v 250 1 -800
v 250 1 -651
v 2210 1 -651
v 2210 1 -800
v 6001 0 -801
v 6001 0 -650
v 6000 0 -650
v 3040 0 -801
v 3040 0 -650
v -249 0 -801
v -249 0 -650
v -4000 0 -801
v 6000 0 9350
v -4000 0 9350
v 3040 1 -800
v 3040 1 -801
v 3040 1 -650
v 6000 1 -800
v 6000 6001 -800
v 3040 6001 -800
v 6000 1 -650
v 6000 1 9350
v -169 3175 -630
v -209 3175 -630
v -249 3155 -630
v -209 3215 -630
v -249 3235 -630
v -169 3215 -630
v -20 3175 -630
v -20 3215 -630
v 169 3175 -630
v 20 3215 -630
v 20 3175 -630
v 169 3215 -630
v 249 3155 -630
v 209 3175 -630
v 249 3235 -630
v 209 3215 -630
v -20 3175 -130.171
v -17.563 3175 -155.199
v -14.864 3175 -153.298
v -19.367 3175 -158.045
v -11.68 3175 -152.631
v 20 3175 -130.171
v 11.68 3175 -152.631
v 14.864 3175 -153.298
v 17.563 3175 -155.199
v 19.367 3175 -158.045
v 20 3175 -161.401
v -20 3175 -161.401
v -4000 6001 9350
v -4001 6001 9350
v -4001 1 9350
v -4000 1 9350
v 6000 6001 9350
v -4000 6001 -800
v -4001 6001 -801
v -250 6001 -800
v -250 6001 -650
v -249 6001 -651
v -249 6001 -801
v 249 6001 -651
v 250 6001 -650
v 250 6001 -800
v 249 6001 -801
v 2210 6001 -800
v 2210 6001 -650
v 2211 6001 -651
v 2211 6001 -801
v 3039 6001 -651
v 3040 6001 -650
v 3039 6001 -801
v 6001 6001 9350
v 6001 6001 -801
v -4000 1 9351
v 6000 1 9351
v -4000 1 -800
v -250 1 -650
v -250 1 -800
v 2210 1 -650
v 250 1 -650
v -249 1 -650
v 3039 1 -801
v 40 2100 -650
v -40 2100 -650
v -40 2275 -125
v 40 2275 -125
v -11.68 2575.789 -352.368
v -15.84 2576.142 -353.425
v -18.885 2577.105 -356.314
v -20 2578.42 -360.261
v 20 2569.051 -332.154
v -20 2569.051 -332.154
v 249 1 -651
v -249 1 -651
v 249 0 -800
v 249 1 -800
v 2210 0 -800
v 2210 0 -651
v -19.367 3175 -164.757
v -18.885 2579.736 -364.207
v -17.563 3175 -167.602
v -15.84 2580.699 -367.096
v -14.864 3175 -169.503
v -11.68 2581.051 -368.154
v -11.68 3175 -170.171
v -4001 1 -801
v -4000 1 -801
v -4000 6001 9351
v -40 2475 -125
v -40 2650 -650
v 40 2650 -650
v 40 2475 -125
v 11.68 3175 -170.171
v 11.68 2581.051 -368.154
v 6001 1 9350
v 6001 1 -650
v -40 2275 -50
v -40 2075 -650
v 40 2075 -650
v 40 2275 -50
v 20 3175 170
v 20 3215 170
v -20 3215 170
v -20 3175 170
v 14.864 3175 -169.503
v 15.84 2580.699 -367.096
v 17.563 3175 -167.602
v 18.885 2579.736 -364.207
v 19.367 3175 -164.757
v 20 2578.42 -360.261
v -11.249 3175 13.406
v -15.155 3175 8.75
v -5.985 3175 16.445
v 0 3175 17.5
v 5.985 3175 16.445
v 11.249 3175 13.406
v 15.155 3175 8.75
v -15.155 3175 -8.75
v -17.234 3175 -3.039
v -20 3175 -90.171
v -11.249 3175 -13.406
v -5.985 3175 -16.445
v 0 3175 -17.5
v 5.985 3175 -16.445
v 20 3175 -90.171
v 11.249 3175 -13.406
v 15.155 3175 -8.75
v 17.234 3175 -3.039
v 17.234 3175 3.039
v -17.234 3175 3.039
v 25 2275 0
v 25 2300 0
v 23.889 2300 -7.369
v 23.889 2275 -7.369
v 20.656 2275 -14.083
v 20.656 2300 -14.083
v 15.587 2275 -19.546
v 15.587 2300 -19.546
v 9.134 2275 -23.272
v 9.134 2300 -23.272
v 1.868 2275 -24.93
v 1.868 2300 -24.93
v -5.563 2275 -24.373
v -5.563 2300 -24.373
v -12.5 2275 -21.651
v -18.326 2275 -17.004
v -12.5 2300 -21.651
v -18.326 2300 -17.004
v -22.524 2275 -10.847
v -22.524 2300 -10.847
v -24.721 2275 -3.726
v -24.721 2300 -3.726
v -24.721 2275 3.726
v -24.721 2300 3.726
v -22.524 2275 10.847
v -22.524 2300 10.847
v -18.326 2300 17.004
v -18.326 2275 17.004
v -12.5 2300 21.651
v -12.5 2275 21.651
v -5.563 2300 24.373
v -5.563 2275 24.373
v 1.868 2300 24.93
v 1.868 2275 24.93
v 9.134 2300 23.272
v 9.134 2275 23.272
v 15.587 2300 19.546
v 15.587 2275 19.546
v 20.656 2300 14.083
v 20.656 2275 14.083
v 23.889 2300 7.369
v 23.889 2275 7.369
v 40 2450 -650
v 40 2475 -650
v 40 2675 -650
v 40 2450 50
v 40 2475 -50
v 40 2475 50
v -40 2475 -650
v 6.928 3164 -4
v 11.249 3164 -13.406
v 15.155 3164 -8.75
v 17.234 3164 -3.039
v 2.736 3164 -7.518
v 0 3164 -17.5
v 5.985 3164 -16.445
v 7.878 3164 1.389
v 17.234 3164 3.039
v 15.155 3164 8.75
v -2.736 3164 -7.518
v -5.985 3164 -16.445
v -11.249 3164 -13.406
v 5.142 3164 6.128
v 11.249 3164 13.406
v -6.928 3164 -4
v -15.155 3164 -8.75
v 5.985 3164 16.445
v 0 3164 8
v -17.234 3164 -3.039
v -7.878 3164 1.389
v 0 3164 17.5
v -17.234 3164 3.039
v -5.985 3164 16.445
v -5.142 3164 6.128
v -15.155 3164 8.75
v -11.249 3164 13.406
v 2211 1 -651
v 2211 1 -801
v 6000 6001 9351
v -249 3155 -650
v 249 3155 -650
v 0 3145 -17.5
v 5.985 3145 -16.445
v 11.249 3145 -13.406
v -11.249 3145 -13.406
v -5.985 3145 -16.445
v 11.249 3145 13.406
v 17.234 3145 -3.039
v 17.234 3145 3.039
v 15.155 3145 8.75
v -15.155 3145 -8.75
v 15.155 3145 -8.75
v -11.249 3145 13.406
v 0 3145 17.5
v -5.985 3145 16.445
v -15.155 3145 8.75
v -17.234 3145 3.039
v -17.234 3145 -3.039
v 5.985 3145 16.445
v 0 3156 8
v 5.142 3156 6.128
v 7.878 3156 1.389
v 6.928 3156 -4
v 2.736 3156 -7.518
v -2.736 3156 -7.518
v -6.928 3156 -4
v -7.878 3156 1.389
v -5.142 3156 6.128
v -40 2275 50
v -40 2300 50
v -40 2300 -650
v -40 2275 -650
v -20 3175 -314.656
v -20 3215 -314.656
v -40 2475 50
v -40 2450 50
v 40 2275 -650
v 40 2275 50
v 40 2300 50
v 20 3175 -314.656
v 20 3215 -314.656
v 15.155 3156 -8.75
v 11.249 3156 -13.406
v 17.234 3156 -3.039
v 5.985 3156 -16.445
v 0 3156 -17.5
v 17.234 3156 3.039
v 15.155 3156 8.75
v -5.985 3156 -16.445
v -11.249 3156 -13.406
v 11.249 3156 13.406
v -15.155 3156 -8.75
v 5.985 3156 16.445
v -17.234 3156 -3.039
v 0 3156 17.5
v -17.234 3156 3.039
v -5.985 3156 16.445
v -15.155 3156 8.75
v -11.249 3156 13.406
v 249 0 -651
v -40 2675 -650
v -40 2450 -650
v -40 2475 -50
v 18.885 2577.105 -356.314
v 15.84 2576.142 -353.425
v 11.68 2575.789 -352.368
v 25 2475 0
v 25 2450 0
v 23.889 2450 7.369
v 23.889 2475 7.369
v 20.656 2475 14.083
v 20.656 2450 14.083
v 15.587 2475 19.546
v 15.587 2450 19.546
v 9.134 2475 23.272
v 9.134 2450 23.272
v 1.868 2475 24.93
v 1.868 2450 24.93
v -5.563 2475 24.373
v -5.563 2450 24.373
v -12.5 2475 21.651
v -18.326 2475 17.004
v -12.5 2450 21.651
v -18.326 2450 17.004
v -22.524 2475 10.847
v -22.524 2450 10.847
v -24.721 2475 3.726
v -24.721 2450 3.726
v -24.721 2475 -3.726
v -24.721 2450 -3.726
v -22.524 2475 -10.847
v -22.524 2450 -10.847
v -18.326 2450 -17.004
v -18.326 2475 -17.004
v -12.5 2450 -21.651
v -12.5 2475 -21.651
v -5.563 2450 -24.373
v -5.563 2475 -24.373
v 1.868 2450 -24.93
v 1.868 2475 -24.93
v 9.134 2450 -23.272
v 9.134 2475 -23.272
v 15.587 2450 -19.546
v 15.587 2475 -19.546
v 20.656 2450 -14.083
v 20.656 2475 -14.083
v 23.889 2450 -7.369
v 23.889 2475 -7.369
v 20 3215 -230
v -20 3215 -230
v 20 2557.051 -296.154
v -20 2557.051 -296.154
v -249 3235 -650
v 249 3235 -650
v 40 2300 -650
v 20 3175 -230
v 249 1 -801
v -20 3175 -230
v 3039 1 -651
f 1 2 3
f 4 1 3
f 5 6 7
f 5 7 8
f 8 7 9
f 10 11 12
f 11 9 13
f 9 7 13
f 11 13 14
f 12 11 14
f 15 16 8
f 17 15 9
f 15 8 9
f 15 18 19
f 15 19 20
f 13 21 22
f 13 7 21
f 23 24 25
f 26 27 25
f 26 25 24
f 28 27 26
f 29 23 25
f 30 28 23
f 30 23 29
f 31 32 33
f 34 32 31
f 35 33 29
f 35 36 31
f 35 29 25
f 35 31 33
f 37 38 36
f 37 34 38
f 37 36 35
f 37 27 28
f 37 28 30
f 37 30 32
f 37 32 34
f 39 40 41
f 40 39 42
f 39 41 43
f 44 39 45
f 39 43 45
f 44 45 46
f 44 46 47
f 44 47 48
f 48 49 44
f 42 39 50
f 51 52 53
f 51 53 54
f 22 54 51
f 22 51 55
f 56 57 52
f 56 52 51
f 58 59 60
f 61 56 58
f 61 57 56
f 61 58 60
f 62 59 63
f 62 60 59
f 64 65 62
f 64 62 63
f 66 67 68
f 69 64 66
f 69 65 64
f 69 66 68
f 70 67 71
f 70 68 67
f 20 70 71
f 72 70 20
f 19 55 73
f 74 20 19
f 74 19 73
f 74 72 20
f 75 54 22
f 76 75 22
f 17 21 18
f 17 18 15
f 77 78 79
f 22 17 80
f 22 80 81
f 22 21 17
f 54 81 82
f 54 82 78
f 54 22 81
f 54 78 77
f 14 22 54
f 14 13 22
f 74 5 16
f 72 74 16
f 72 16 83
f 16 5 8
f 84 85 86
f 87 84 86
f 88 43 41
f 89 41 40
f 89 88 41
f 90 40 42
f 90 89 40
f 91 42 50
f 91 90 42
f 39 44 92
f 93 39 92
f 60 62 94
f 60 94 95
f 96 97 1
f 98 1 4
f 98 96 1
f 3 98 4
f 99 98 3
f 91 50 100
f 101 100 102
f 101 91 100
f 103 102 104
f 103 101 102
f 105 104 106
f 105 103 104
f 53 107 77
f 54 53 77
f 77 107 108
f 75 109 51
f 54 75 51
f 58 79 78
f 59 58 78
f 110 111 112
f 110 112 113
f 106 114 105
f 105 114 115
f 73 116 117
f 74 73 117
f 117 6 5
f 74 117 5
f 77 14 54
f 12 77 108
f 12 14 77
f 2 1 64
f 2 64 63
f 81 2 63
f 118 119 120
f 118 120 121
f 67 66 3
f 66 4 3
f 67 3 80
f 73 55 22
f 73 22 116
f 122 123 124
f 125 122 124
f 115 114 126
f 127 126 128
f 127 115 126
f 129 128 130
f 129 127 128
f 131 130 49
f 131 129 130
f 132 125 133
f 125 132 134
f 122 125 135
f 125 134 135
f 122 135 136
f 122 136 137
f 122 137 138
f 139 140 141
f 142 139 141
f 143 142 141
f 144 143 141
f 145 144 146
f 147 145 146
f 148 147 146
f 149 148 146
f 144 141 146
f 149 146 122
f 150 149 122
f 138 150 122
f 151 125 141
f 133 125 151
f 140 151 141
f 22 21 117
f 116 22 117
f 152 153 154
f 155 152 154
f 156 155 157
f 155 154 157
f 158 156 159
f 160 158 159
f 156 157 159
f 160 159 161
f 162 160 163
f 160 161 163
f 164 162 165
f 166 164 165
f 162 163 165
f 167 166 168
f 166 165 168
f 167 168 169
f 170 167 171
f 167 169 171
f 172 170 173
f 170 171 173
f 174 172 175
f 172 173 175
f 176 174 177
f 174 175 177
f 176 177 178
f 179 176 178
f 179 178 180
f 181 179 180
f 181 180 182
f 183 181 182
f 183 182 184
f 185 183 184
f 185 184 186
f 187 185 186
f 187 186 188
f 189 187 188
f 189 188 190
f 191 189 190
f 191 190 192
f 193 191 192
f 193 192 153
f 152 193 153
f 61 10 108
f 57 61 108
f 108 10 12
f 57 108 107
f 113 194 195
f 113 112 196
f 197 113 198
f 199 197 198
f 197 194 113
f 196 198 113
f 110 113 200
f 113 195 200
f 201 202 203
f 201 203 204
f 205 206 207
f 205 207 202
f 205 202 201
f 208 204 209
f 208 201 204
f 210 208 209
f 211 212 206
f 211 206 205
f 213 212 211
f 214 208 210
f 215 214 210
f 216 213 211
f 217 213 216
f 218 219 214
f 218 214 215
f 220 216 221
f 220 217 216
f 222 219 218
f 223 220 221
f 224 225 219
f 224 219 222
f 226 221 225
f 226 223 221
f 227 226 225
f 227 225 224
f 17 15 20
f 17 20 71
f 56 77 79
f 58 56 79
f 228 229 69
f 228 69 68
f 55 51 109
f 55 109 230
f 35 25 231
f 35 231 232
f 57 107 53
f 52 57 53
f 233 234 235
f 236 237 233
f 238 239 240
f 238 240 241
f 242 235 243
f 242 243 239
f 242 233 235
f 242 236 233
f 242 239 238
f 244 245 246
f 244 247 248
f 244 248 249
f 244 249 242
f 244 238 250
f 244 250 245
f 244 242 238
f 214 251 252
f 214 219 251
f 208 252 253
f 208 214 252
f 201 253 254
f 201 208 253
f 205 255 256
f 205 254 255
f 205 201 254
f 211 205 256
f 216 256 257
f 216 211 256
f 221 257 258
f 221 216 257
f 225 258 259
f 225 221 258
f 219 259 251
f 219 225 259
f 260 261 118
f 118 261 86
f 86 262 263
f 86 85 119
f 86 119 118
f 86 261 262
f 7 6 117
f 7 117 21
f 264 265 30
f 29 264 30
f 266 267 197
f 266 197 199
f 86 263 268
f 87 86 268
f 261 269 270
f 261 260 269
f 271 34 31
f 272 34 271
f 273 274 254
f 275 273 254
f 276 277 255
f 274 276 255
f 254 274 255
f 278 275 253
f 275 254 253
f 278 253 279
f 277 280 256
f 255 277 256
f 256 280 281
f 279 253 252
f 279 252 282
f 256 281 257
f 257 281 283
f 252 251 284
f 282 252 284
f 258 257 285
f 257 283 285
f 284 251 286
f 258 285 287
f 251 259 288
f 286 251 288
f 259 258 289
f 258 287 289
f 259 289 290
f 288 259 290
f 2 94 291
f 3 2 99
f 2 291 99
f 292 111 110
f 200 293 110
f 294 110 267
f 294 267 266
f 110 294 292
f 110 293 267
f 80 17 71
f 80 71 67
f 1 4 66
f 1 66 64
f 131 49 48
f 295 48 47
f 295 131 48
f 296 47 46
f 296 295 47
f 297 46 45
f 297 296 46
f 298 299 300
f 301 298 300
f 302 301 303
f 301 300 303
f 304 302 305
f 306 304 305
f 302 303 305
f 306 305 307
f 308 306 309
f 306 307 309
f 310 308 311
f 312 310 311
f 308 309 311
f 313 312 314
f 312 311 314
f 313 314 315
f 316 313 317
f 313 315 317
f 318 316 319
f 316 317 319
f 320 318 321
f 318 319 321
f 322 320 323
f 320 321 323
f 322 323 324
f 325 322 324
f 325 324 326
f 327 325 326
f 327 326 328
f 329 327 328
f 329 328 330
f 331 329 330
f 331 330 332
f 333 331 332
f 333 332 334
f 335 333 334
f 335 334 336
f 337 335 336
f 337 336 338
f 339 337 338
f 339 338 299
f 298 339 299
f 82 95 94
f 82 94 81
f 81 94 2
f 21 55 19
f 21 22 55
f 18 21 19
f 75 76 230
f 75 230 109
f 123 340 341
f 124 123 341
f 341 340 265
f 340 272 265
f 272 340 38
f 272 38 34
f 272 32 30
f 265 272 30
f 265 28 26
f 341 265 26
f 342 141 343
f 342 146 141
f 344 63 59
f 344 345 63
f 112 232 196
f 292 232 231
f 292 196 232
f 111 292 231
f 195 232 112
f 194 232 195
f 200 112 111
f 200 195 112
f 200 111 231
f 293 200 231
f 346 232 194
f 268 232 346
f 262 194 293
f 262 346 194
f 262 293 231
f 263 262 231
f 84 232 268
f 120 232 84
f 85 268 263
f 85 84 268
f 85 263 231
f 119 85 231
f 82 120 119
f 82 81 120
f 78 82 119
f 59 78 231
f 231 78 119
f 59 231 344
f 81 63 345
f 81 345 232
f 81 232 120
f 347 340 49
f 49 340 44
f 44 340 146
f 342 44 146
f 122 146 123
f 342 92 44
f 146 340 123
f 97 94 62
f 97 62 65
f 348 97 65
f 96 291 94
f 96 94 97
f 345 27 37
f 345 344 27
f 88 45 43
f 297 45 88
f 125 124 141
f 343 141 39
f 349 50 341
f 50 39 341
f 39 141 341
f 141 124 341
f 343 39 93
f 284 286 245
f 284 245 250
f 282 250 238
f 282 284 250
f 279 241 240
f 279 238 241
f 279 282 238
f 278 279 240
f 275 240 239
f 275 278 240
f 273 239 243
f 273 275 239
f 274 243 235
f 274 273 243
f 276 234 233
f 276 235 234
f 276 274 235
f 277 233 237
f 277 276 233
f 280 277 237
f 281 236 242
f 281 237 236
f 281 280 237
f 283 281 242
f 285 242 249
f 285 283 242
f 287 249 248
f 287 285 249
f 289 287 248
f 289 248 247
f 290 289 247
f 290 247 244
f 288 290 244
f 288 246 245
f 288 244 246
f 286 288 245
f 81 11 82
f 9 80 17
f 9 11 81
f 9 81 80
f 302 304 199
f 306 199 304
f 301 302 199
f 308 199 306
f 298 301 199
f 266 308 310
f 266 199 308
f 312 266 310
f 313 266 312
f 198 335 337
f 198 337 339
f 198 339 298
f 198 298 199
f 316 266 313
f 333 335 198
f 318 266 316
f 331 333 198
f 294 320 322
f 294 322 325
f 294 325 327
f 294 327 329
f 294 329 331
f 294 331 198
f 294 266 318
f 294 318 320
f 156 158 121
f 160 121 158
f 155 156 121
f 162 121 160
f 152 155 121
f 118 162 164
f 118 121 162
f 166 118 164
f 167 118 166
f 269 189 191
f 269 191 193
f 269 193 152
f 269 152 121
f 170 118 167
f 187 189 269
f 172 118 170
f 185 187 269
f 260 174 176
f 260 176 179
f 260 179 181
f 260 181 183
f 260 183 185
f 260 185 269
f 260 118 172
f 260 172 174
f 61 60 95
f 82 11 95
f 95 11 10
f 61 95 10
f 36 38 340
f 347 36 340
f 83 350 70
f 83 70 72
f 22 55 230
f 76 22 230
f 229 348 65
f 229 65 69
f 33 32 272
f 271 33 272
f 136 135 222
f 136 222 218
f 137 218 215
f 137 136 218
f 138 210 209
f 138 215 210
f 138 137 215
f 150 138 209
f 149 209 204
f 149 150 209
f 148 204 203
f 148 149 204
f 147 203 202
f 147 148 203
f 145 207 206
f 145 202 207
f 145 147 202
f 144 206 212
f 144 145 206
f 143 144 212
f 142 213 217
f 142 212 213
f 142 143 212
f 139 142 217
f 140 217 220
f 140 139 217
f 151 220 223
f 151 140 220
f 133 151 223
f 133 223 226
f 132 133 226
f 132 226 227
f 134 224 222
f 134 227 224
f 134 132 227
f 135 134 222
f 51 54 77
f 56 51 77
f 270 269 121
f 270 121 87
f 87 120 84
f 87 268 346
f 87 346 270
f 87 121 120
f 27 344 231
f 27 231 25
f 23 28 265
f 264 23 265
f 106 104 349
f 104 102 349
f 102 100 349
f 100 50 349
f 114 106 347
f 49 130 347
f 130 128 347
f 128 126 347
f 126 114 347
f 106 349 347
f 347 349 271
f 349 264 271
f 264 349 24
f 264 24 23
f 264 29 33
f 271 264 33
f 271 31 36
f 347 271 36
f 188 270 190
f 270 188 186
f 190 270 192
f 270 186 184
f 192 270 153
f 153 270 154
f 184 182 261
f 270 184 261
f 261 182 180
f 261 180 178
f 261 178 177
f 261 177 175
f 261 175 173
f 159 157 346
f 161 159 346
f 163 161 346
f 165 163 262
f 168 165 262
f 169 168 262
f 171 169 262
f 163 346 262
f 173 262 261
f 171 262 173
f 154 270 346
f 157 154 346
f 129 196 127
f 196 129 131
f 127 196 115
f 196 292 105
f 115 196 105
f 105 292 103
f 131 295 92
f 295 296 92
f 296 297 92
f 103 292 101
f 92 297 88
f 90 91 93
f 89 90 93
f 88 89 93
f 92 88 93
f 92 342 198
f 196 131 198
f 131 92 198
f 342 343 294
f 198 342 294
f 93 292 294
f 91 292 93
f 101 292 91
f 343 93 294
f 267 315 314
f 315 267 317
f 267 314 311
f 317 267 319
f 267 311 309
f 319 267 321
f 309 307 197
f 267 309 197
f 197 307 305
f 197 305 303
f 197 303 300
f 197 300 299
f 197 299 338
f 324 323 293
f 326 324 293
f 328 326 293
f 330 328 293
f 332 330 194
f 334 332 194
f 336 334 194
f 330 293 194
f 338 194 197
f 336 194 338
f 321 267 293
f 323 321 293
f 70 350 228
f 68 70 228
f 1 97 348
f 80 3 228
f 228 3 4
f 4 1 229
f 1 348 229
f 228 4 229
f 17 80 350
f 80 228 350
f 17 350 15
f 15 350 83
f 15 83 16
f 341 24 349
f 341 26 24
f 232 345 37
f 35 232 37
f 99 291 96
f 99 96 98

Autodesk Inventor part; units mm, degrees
ref_plane "YZ Plane" through (0, 0, 0) normal (1, 0, 0) x (0, 1, 0)
ref_plane "XZ Plane" through (0, 0, 0) normal (0, 1, 0) x (-1, 0, 0)
ref_plane "XY Plane" through (0, 0, 0) normal (0, 0, 1) x (1, 0, 0)
sketch "Boceto1" plane through (0, 0, 0) normal (0, 1, 0) x (-1, 0, 0)
  line L0 (0, 0) -> (0, -650) construction
  line L1 (0, -650) -> (4000, -650) construction
  line L2 (4000, -650) -> (-6000, -650)
  line L3 (-6000, -650) -> (-6000, 9350)
  line L4 (-6000, 9350) -> (4000, 9350)
  line L5 (4000, 9350) -> (4000, -650)
  dimension "d1" = 650
  dimension "d2" = 4000
  dimension "d3" = 10000
  dimension "d4" = 10000
extrude "Extrusión1" add sketch "Boceto1" along normal blind 1
sketch "Boceto3" plane through (0, 1, 0) normal (0, 1, 0) x (1, 0, 0)
  line L0 (-4000, 650) -> (-4000, -9350) construction
  line L1 (-4000, -9350) -> (6000, -9350) construction
  line L2 (6000, -9350) -> (6000, 650) construction
  line L3 (6000, 650) -> (-4000, 650) construction
  line L4 (6000, 650) -> (6000, 651)
  line L5 (-4000, 650) -> (-4000, -9350) projected
  line L6 (-4001, 650) -> (-4001, -9350)
  line L7 (-4001, -9350) -> (-4000, -9350)
  line L8 (-4000, -9350) -> (-4000, 650)
  line L9 (-4000, -9350) -> (6000, -9350)
  line L10 (6000, -9350) -> (6000, -9351)
  line L11 (6000, -9351) -> (-4000, -9351)
  line L12 (-4000, -9351) -> (-4000, -9350)
  line L13 (6000, -9350) -> (6001, -9350)
  line L14 (6001, -9350) -> (6001, 650)
  line L15 (6001, 650) -> (6000, 650) construction
  line L16 (6000, 650) -> (6000, -9350)
  line L17 (-50, 651) -> (200, 651)
  line L18 (200, 651) -> (-200, 651)
  line L19 (0, 651) -> (250, 651) construction
  line L20 (250, 651) -> (-249, 651) construction
  line L21 (-250, 651) -> (-249, 651) construction
  line L22 (-249, 651) -> (-249, 801)
  line L23 (-249, 801) -> (-250, 801)
  line L24 (-250, 800) -> (-250, 651)
  line L25 (250, 651) -> (249, 651) construction
  line L26 (249, 651) -> (249, 801)
  line L27 (249, 801) -> (250, 801)
  line L28 (250, 800) -> (250, 651)
  line L29 (249, 651) -> (-249, 651)
  line L30 (6000, 801) -> (6000, 800) construction
  line L31 (249, 800) -> (249, 801)
  line L32 (6001, 650) -> (6000, 650) construction
  line L33 (6000, 650) -> (6000, 800)
  line L34 (6000, 800) -> (6001, 800) construction
  line L35 (6001, 800) -> (6001, 650)
  line L36 (-250, 801) -> (-4000, 801)
  line L37 (-4000, 801) -> (-4000, 800) construction
  line L38 (-4000, 800) -> (-250, 800)
  line L39 (-250, 800) -> (-250, 801) construction
  line L40 (-4000, 801) -> (-4001, 801)
  line L41 (-4001, 801) -> (-4001, 650)
  line L42 (-4000, 651) -> (-4000, 800)
  line L43 (-250, 651) -> (-250, 650)
  line L44 (250, 651) -> (250, 650)
  line L45 (6000, 650) -> (-4000, 650) projected
  line L46 (6000, 801) -> (6001, 801)
  line L47 (6001, 801) -> (6001, 800)
  line L48 (6001, 800) -> (6000, 800) construction
  line L49 (6000, 800) -> (6000, 801) construction
  line L50 (2210, 650) -> (2210, 200) construction
  line L51 (2210, 200) -> (3040, 200) construction
  line L52 (3040, 200) -> (3040, 650) construction
  line L53 (3040, 650) -> (2210, 650) construction
  line L54 (2210, 650) -> (2211, 650)
  line L55 (2211, 651) -> (2211, 800)
  line L56 (2211, 800) -> (2210, 800) construction
  line L57 (2210, 800) -> (2210, 650)
  line L58 (3040, 650) -> (3039, 650)
  line L59 (3039, 651) -> (3039, 800)
  line L60 (3039, 800) -> (3040, 800) construction
  line L61 (3040, 800) -> (3040, 650)
  line L62 (2211, 650) -> (3039, 650)
  line L63 (3039, 650) -> (3039, 651) construction
  line L64 (3039, 651) -> (2211, 651)
  line L65 (2211, 651) -> (2211, 650) construction
  line L66 (2210, 800) -> (250, 800)
  line L67 (6000, 800) -> (3040, 800)
  line L68 (2211, 801) -> (2211, 800)
  line L69 (3039, 800) -> (3039, 801)
  line L70 (249, 801) -> (2211, 801)
  line L71 (3039, 801) -> (6000, 801)
  line L72 (-4000, 651) -> (-4000, 650)
  point P0 (0, 0)
  point P1 (-4000, -9350)
  point P2 (-4000, -9350)
  point P3 (-2000, -9350)
  point P4 (6000, 650)
  point P5 (6000, 650)
  dimension "d7" = 1
  dimension "d8" = 1
  dimension "d9" = 1
  dimension "d10" = 1
  dimension "d24" = 10000
  dimension "d32" = 0
  dimension "d34" = 0
  dimension "d36" = 10000
  dimension "d37" = 8000
  dimension "d38" = 10000
  dimension "d39" = 8000
  dimension "d40" = 10000
  dimension "d41" = 8000
  dimension "d42" = 0
  dimension "d81" = 250
  dimension "d82" = 500
  dimension "d83" = 1
  dimension "d84" = 150
  dimension "d85" = 1
  dimension "d86" = 150
  dimension "d87" = 1
  dimension "d88" = 1
  dimension "d89" = 90
  dimension "d90" = 90
  dimension "d94" = 0
  dimension "d95" = 0
  dimension "d96" = 151
  dimension "d97" = 5751
  dimension "d98" = 4250
  dimension "d99" = 0
  dimension "d100" = 1
  dimension "d101" = 0
  dimension "d102" = 0
  dimension "d103" = 150
  dimension "d104" = 5800
  dimension "d105" = 6050
  dimension "d106" = 0
  dimension "d107" = 1
  dimension "d108" = 0
  dimension "d111" = 1
  dimension "d112" = 1
  dimension "d113" = 1
  dimension "d114" = 90
  dimension "d115" = 151
  dimension "d116" = 150
  dimension "d117" = 2961
extrude "Extrusión2" add sketch "Boceto3" along normal blind 6000 contours L4 L33 L67 L61 L45 L57 L66 L28 L44 L43 L24 L38 L42 L72 L5 L7 L6 L41 L40 L36 L23 L22 L29 L18 L17 L26 L27 L70 L68 L55 L64 L59 L69 L71 L46 L47 L35 L14 L13 L16 | L10 L11 L12 L9
sketch "Boceto4" plane through (0, 1, 0) normal (0, 1, 0) x (1, 0, 0)
  line L0 (0, 0) -> (370, 0) construction
  line L1 (0, 0) -> (2210, 0) construction
  line L2 (0, 0) -> (-385, 0) construction
  line L3 (0, 185) -> (0, 0) construction
  line L4 (0, 0) -> (-1260, 0) construction
  line L5 (0, 360) -> (0, 0) construction
  line L6 (0, 0) -> (250, 0) construction
  line L7 (250, 0) -> (250, -820) construction
  line L8 (250, -820) -> (0, -820) construction
  line L9 (0, -820) -> (0, 0) construction
  line L10 (0, 0) -> (-300, 0) construction
  line L11 (-300, 0) -> (-300, -1247) construction
  line L12 (-300, -1247) -> (0, -1247) construction
  line L13 (0, -1247) -> (0, 0) construction
  line L14 (0, 0) -> (30, 0) construction
  line L15 (30, 0) -> (30, -2220) construction
  line L16 (30, -2220) -> (0, -2220) construction
  line L17 (0, -2220) -> (0, 0) construction
  line L18 (0, 0) -> (1200, 0) construction
  line L19 (1200, 0) -> (1200, -720) construction
  line L20 (1200, -720) -> (0, -720) construction
  line L21 (0, -720) -> (0, 0) construction
  line L22 (0, 0) -> (-650, 0) construction
  line L23 (-650, 0) -> (-650, -650) construction
  line L24 (-650, -650) -> (0, -650) construction
  line L25 (0, -650) -> (0, 0) construction
  line L26 (6000, 650) -> (-4000, 650) projected
  line L27 (0, 0) -> (-1300, 0) construction
  line L28 (-1300, 0) -> (-1300, -1650) construction
  line L29 (-1300, -1650) -> (0, -1650) construction
  line L30 (0, -1650) -> (0, 0) construction
  line L31 (0, 0) -> (515, 0) construction
  line L32 (515, 0) -> (515, -1475) construction
  line L33 (515, -1475) -> (0, -1475) construction
  line L34 (0, -1475) -> (0, 0) construction
  line L35 (0, 0) -> (485, 0) construction
  line L36 (485, 0) -> (485, -1240) construction
  line L37 (485, -1240) -> (0, -1240) construction
  line L38 (0, -1240) -> (0, 0) construction
  line L39 (0, 0) -> (495, 0) construction
  line L40 (495, 0) -> (495, -972) construction
  line L41 (495, -972) -> (0, -972) construction
  line L42 (0, -972) -> (0, 0) construction
  line L43 (0, 0) -> (-385, 0) construction
  line L44 (-385, 0) -> (-385, -185) construction
  line L45 (-385, -185) -> (0, -185) construction
  line L46 (0, -185) -> (0, 0) construction
  line L47 (0, 0) -> (-1360, 0) construction
  line L48 (-1360, 0) -> (-1360, 267) construction
  line L49 (-1360, 267) -> (0, 267) construction
  line L50 (0, 267) -> (0, 0) construction
  line L51 (30, 0) -> (3030, 0) construction
  line L52 (0, 0) -> (-1414.2136, -1414.2136)
  line L53 (0, 0) -> (2000, 0) construction
  line L54 (0, 0) -> (30, -33.541)
  line L55 (30, -33.541) -> (-33.6396, 30.0986)
  line L56 (-33.6396, 30.0986) -> (-1447.8532, -1384.115)
  line L57 (-385, -185) -> (-1360, 0) construction
  point P0 (0, 650)
  dimension "d13" = 370
  dimension "d14" = 2210
  dimension "d19" = 250
  dimension "d20" = 820
  dimension "d21" = 300
  dimension "d22" = 1247
  dimension "d47" = 30
  dimension "d48" = 2220
  dimension "d49" = 1200
  dimension "d50" = 720
  dimension "d51" = 650
  dimension "d52" = 650
  dimension "d54" = 650
  dimension "d56" = 1300
  dimension "d57" = 1650
  dimension "d58" = 515
  dimension "d59" = 1475
  dimension "d60" = 485
  dimension "d61" = 1240
  dimension "d62" = 495
  dimension "d63" = 972
  dimension "d64" = 385
  dimension "d65" = 185
  dimension "d66" = 1360
  dimension "d67" = 267
  dimension "d70" = 2000
  dimension "d71" = 135
  dimension "d72" = 45
  dimension "d73" = 90
  dimension "d74" = 2000
sketch "Boceto5" plane through (0, 0, 0) normal (0, -1, 0) x (1, 0, 0)
  line L0 (-249, -801) -> (-4001, -801) projected
  line L1 (-249, -651) -> (-249, -801) projected
  line L2 (250, -650) -> (250, -800) projected
  line L3 (250, -800) -> (2210, -800) projected
  line L4 (2210, -800) -> (2210, -650) projected
  line L5 (6001, -801) -> (3039, -801) projected
  line L6 (3039, -801) -> (3039, -651) projected
  line L7 (6000, -800) -> (6000, -650) projected
  line L8 (-4000, -650) -> (-4000, -800) projected
  line L9 (6000, -650) -> (-4000, -650) projected
  line L10 (6001, -801) -> (3039, -801) projected
  line L11 (6000, -650) -> (3040, -650) projected
  line L12 (6001, -801) -> (3040, -801)
  line L13 (3040, -801) -> (3040, -650)
  line L14 (3040, -650) -> (6001, -650)
  line L15 (6001, -650) -> (6001, -801)
  line L16 (250, -800) -> (2210, -800) projected
  line L17 (249, -801) -> (249, -651) projected
  line L18 (2210, -800) -> (249, -800)
  line L19 (249, -800) -> (249, -651)
  line L20 (249, -651) -> (2210, -651)
  line L21 (2210, -651) -> (2210, -800)
  line L22 (-250, -650) -> (-4000, -650) projected
  line L23 (-249, -801) -> (-4000, -801)
  line L24 (-4000, -801) -> (-4000, -650)
  line L25 (-4000, -650) -> (-249, -650)
  line L26 (-249, -650) -> (-249, -801)
  point P0 (0, 0)
  point P1 (-249, -650)
extrude "Extrusión3" add sketch "Boceto5" against normal blind 1 contours L9 L14 L15 L5 L13 | L0 L24 L8 L9 L26 L1 | L20 L4 L3 L2 | L2 L18 L17 L20
sketch "Boceto6" plane through (-249, 1, -650) normal (0, 0, 1) x (1, 0, 0)
  line L0 (499, 0) -> (0, 0) construction
  line L1 (499, 0) -> (499, 6000) construction
  line L2 (-1, 6000) -> (499, 6000) construction
  line L3 (-1, 0) -> (-1, 6000) construction
  line L4 (0, 0) -> (-1, 0) construction
  line L5 (249, -1) -> (249, 2299) construction
  line L6 (249, 2299) -> (249, 2449) construction
  line L7 (249, 2449) -> (249, 2661.5) construction
  line L8 (249, 2449) -> (289, 2449) construction
  line L9 (289, 2449) -> (289, 2474) construction
  line L10 (289, 2474) -> (249, 2474) construction
  line L11 (249, 2474) -> (249, 2449) construction
  line L12 (289, 2474) -> (209, 2474)
  line L13 (209, 2474) -> (209, 2449)
  line L14 (209, 2449) -> (289, 2449)
  line L15 (289, 2449) -> (289, 2474)
  line L16 (249, 2274) -> (289, 2274) construction
  line L17 (289, 2274) -> (289, 2299) construction
  line L18 (289, 2299) -> (249, 2299) construction
  line L19 (249, 2299) -> (249, 2274) construction
  line L20 (289, 2299) -> (209, 2299)
  line L21 (209, 2299) -> (209, 2274)
  line L22 (209, 2274) -> (289, 2274)
  line L23 (289, 2274) -> (289, 2299)
  line L24 (249, 2661.5) -> (274, 2661.5) construction
  line L25 (274, 2661.5) -> (274, 2674) construction
  line L26 (274, 2674) -> (249, 2674) construction
  line L27 (249, 2674) -> (249, 2661.5) construction
  line L28 (274, 2674) -> (224, 2674)
  line L29 (224, 2674) -> (224, 2649)
  line L30 (224, 2649) -> (274, 2649)
  line L31 (274, 2649) -> (274, 2674)
  line L32 (249, 2086.5) -> (274, 2086.5) construction
  line L33 (274, 2086.5) -> (274, 2099) construction
  line L34 (274, 2099) -> (249, 2099) construction
  line L35 (249, 2099) -> (249, 2086.5) construction
  line L36 (274, 2099) -> (224, 2099)
  line L37 (224, 2099) -> (224, 2074)
  line L38 (224, 2074) -> (274, 2074)
  line L39 (274, 2074) -> (274, 2099)
  dimension "d120" = 2300
  dimension "d121" = 150
  dimension "d122" = 212.5
  dimension "d125" = 40
  dimension "d126" = 25
  dimension "d127" = 80
  dimension "d128" = 25
  dimension "d129" = 40
  dimension "d130" = 25
  dimension "d131" = 80
  dimension "d132" = 25
  dimension "d135" = 25
  dimension "d136" = 12.5
  dimension "d137" = 50
  dimension "d138" = 25
  dimension "d142" = 25
  dimension "d143" = 12.5
  dimension "d144" = 50
  dimension "d145" = 25
  dimension "d164" = 2274
  dimension "d165" = 2099
  dimension "d166" = 210
  dimension "d167" = 225
extrude "Extrusión4" add sketch "Boceto6" along normal blind 80 contours L15 L14 L13 L12 | L23 L22 L21 L20
ref_plane "Plano de trabajo1" through (0, 2450, -650) normal (1, 0, 0) x (0, 1, 0)
sketch "Boceto7" plane through (0, 2450, -650) normal (1, 0, 0) x (0, 1, 0)
  line L0 (-2449, 0) -> (3551, 0) construction
  line L1 (25, 0) -> (25, 80) construction
  line L2 (0, 0) -> (0, 80) construction
  line L3 (-150, 0) -> (-150, 80) construction
  line L4 (-175, 0) -> (-175, 80) construction
  line L5 (-150, 0) -> (-150, 650) construction
  line L6 (-150, 0) -> (500, 0) construction
  line L7 (-150, 650) -> (-150, 0) construction
  line L8 (225, 0) -> (200, 0) construction
  line L9 (25, 0) -> (0, 0) construction
  line L10 (25, 0) -> (25, 80) construction
  line L11 (0, 80) -> (25, 80) construction
  line L12 (0, 0) -> (0, 80) construction
  line L13 (-150, 0) -> (-175, 0) construction
  line L14 (-150, 0) -> (-150, 80) construction
  line L15 (-175, 80) -> (-150, 80) construction
  line L16 (-175, 0) -> (-175, 80) construction
  line L17 (-350, 0) -> (-375, 0) construction
  line L18 (-2449, 10000) -> (-2449, -150) construction
  line L19 (-2449, -150) -> (3551, -150) construction
  line L20 (3551, 10000) -> (3551, -150) construction
  line L21 (-2449, 10000) -> (3551, 10000) construction
  line L22 (-150, 80) -> (-175, 80)
  line L23 (-175, 80) -> (-175, 700)
  line L24 (-175, 700) -> (-150, 700)
  line L25 (-150, 700) -> (-150, 80)
  line L26 (25, 0) -> (25, 650) construction
  line L27 (25, 650) -> (25, 0) construction
  line L28 (25, 80) -> (0, 80)
  line L29 (0, 80) -> (0, 700)
  line L30 (0, 700) -> (25, 700)
  line L31 (25, 700) -> (25, 80)
  line L32 (25, 650) -> (25, 600) construction
  line L33 (-150, 650) -> (-150, 600) construction
  line L34 (225, 0) -> (25, 600)
  line L35 (200, 0) -> (25, 525)
  line L36 (-350, 0) -> (-175, 525)
  line L37 (-375, 0) -> (-350, 0)
  line L38 (-375, 0) -> (-175, 600)
  line L39 (200, 0) -> (225, 0)
  line L40 (-350, 0) -> (-375, 0)
  line L41 (225, 0) -> (-375, 0)
  line L42 (-375, 0) -> (-350, 0)
  line L43 (-175, 600) -> (-175, 525)
  line L44 (-350, 0) -> (-375, 0)
  line L45 (225, 0) -> (200, 0)
  line L46 (-375, 0) -> (-350, 0)
  line L47 (-175, 600) -> (-175, 525)
  point P0 (-2450, 650)
  point P1 (25, 525)
  point P2 (25, 600)
  dimension "d139" = 650
  dimension "d140" = 90
  dimension "d150" = 25
  dimension "d151" = 620
  dimension "d152" = 650
  dimension "d153" = 25
  dimension "d154" = 620
  dimension "d155" = 50
  dimension "d156" = 18.435
  dimension "d157" = 18.435
  dimension "d158" = 3526
  dimension "d159" = 3526
  dimension "d160" = 700
  dimension "d161" = 600
sketch "Boceto8" plane through (-249, 1, -650) normal (0, 0, 1) x (1, 0, 0)
  line L0 (249, 2674) -> (249, 3174) construction
  line L1 (289, 2474) -> (289, 2449) construction
  line L2 (289, 2449) -> (209, 2449) construction
  line L3 (209, 2449) -> (209, 2474) construction
  line L4 (209, 2474) -> (289, 2474) construction
  line L5 (289, 2299) -> (289, 2274) construction
  line L6 (289, 2274) -> (209, 2274) construction
  line L7 (209, 2274) -> (209, 2299) construction
  line L8 (209, 2299) -> (289, 2299) construction
  line L9 (499, 0) -> (0, 0) construction
  line L10 (499, 0) -> (499, 6000) construction
  line L11 (-1, 6000) -> (499, 6000) construction
  line L12 (-1, 0) -> (-1, 6000) construction
  line L13 (0, 0) -> (-1, 0) construction
  line L14 (0, -1) -> (0, 6000) construction
  line L15 (249, 3174) -> (0, 3174) construction
  line L16 (0, 3174) -> (0, 3214) construction
  line L17 (0, 3214) -> (249, 3214) construction
  line L18 (249, 3214) -> (249, 3174) construction
  line L19 (498, 0) -> (498, 6000) projected
  line L20 (0, 3174) -> (498, 3174)
  line L21 (498, 3174) -> (498, 3214)
  line L22 (498, 3214) -> (0, 3214)
  line L23 (0, 3214) -> (0, 3174)
  point P0 (249, -1)
  dimension "d146" = 500
  dimension "d147" = 40
  dimension "d173" = 3214
  dimension "d174" = 3214
  dimension "d175" = 250
  dimension "d176" = 3174
  dimension "d177" = 1
extrude "Extrusión5" add sketch "Boceto8" along normal blind 20
extrude "Extrusión6" add sketch "Boceto7" along normal mid plane 80
sketch "Boceto9" plane through (-249, 3215, -650) normal (0, 1, 0) x (1, 0, 0)
  line L0 (0, -20) -> (498, -20) projected
  line L1 (249, -20) -> (269, -20)
  line L2 (269, -20) -> (229, -20)
  line L3 (229, -20) -> (269, -20)
  line L4 (269, -20) -> (269, -820)
  line L5 (269, -820) -> (229, -820)
  line L6 (229, -820) -> (229, -20)
  line L7 (498, -20) -> (458, -20) construction
  line L8 (0, -20) -> (40, -20) construction
  line L9 (498, -20) -> (0, -20) projected
  line L10 (229, -20) -> (229, -420) construction
  line L11 (229, -420) -> (269, -420) construction
  line L12 (40, -20) -> (80, -20)
  line L13 (458, -20) -> (418, -20)
  line L14 (40, -20) -> (229, -420)
  line L15 (80, -20) -> (229, -335.3439)
  line L16 (418, -20) -> (269, -335.3439)
  line L17 (458, -20) -> (269, -420)
  point P0 (249, -650)
  point P1 (418, -20)
  point P2 (269, -20)
  point P3 (229, -20)
  point P4 (229, -335.3439)
  point P5 (80, -20)
  point P6 (40, -20)
  dimension "d168" = 20
  dimension "d169" = 40
  dimension "d170" = 0
  dimension "d171" = 40
  dimension "d172" = 800
  dimension "d178" = 40
  dimension "d179" = 40
  dimension "d180" = 400
  dimension "d181" = 40
  dimension "d182" = 40
extrude "Extrusión7" add sketch "Boceto9" against normal blind 40 contours L0 L15 L6 L14 | L6 L0 L4 L5 | L4 L16 L0 L17
sketch "Boceto10" plane through (20, 3215, 170) normal (1, 0, 0) x (0, 0, -1)
  line L0 (0, 0) -> (400, 0) construction
  line L1 (0, 0) -> (0, -40) construction
  line L2 (400, -40) -> (0, -40) construction
  line L3 (400, 0) -> (400, -40) construction
  line L4 (820, -540) -> (220, -740) construction
  line L5 (820, -740) -> (820, -765) construction
  line L6 (820, -740) -> (295, -740) construction
  line L7 (295, -740) -> (820, -565) construction
  line L8 (820, -540) -> (820, -565) construction
  line L9 (820, -540) -> (220, -740) construction
  line L10 (220, -740) -> (120, -740) construction
  line L11 (120, -740) -> (120, -765) construction
  line L12 (820, -765) -> (120, -765) construction
  line L13 (0, -40) -> (400, -40) projected
  line L14 (220, -740) -> (820, -540) projected
  line L15 (502.759, -647.7642) -> (466.759, -659.7642)
  line L16 (400, -40) -> (0, -40) projected
  line L17 (0, 0) -> (400, 0) projected
  line L18 (260.171, -40) -> (300.171, -40)
  line L19 (340.171, -40) -> (322.6308, -40)
  line L20 (260.171, -40) -> (466.759, -659.7642)
  line L21 (300.171, -40) -> (502.759, -647.7642)
  line L22 (322.6308, -40) -> (522.9729, -641.0262)
  line L23 (340.171, -40) -> (538.759, -635.7642)
  line L24 (466.1539, -657.9487) -> (538.1539, -633.9487)
  point P0 (170, -3215)
  point P1 (522.3677, -639.2108)
  dimension "d198" = 1.9137
  dimension "d199" = 16.6401
  dimension "d200" = 37.9473
  dimension "d201" = 75.8947
  dimension "d202" = 297.0919
  dimension "d203" = 1.9137
  dimension "d204" = 1.9137
extrude "Extrusión8" add sketch "Boceto10" against normal blind 40 contours L13 L21 L14 L20 | L14 L21 L15 L20 | L13 L23 L14 L22
fillet "Empalme1" radius 8.32 4 edges at (-20, 2875.3946, -252.4993) (-20, 2878.0256, -269.1624) (20, 2878.0256, -269.1624) (20, 2875.3946, -252.4993)
sketch "Boceto11" plane through (-249, 3215, -650) normal (0, 1, 0) x (1, 0, 0)
  line L0 (0, 0) -> (498, 0) projected
  line L1 (498, 0) -> (498, -20) projected
  line L2 (0, 0) -> (498, 0)
  line L3 (498, 0) -> (498, -20)
  line L4 (498, -20) -> (0, -20)
  line L5 (0, -20) -> (0, 0)
  point P0 (249, -650)
extrude "Extrusión9" add sketch "Boceto11" along normal blind 20
sketch "Boceto12" plane through (-249, 3175, -650) normal (0, -1, 0) x (1, 0, 0)
  line L0 (0, 0) -> (498, 0) projected
  line L1 (269, 20) -> (418, 20) projected
  line L2 (229, 488.5991) -> (229, 420) projected
  line L3 (229, 420) -> (40, 20) projected
  line L4 (0, 20) -> (40, 20) projected
  line L5 (0, 0) -> (0, 20) projected
  line L6 (498, 0) -> (0, 0) projected
  line L7 (498, 0) -> (498, 20) projected
  line L8 (458, 20) -> (498, 20) projected
  line L9 (458, 20) -> (269, 420) projected
  line L10 (269, 559.829) -> (269, 820) projected
  line L11 (269, 20) -> (418, 20) projected
  line L12 (269, 20) -> (269, 335.3439) projected
  line L13 (269, 335.3439) -> (418, 20) projected
  line L14 (80, 20) -> (229, 20) projected
  line L15 (80, 20) -> (229, 335.3439) projected
  line L16 (229, 335.3439) -> (229, 20) projected
  line L17 (458, 20) -> (498, 20) projected
  line L18 (498, 0) -> (0, 0) projected
  line L19 (498, 20) -> (0, 20)
  line L20 (0, 20) -> (0, 0)
  line L21 (0, 0) -> (498, 0)
  line L22 (498, 0) -> (498, 20)
  line L23 (269, 820) -> (229, 820) projected
  line L24 (237.32, 497.3692) -> (260.68, 497.3692) projected
  line L25 (269, 488.5991) -> (269, 519.829) projected
  line L26 (269, 519.829) -> (229, 519.829) projected
  line L27 (229, 519.829) -> (229, 488.5991) projected
  line L28 (260.68, 479.829) -> (237.32, 479.829) projected
  line L29 (269, 420) -> (269, 488.5991) projected
  line L30 (229, 559.829) -> (269, 559.829) projected
  line L31 (229, 820) -> (229, 559.829) projected
  ellipse E0 centre (260.68, 488.5991) end of major axis (260.68, 479.8291) minor radius 8.32 (269, 488.5991) -> (260.68, 497.3692) ccw projected
  ellipse E1 centre (237.32, 488.5991) end of major axis (237.32, 479.8291) minor radius 8.32 (237.32, 497.3692) -> (229, 488.5991) ccw projected
  ellipse E2 centre (237.32, 488.5991) end of major axis (237.32, 497.3691) minor radius 8.32 (229, 488.5991) -> (237.32, 479.829) ccw projected
  ellipse E3 centre (260.68, 488.5991) end of major axis (260.68, 497.3691) minor radius 8.32 (260.68, 479.829) -> (269, 488.5991) ccw projected
  point P0 (249, 650)
  point P1 (80, 20)
  point P2 (40, 20)
  point P3 (458, 20)
  point P4 (418, 20)
  point P5 (269, 20)
  point P6 (229, 20)
extrude "Extrusión10" add sketch "Boceto12" along normal blind 20 contours L5 L4 L19 L14 L1 L8 L7 L0
sketch "Boceto13" plane through (-40, 2300, -650) normal (0, 1, 0) x (1, 0, 0)
  circle A0 centre (40, -650) radius 25
  dimension "d193" = 50
extrude "Extrusión11" cut sketch "Boceto13" along normal blind 200 and the other way blind 50
sketch "Boceto14" plane through (-20, 3175, 170) normal (0, -1, 0) x (1, 0, 0)
  point P0 (20, -170)
sketch "Boceto15" plane through (0, 2450, -650) normal (1, 0, 0) x (0, 1, 0)
  line L0 (128.4203, 289.7392) -> (725, 488.5991) construction
  line L1 (128.4203, 289.7392) -> (128.4203, 289.7392) construction
  line L2 (725, 488.5991) -> (128.4203, 289.7392) construction
  line L3 (725, 420) -> (725, 488.5991) construction
  line L4 (765, 420) -> (725, 420) construction
  line L5 (765, 820) -> (765, 420) construction
  line L6 (765, 820) -> (725, 820) construction
  line L7 (725, 559.829) -> (725, 820) construction
  line L8 (725, 559.829) -> (107.0513, 353.8461) construction
  line L9 (119.0513, 317.8461) -> (107.0513, 353.8461) construction
  line L10 (119.0513, 317.8461) -> (725, 519.829) construction
  line L11 (725, 488.5991) -> (725, 519.829) construction
  line L12 (725, 820) -> (725, 559.829) construction
  line L13 (725, 559.829) -> (725, 820) construction
  line L14 (725, 650) -> (714, 650)
  line L15 (714, 650) -> (714, 667.5)
  line L16 (714, 667.5) -> (725, 667.5)
  line L17 (725, 667.5) -> (725, 650)
  line L18 (714, 650) -> (706, 650)
  line L19 (706, 650) -> (706, 658)
  line L20 (706, 658) -> (714, 658)
  line L21 (714, 658) -> (714, 650)
  line L22 (706, 650) -> (695, 650)
  line L23 (695, 650) -> (695, 667.5)
  line L24 (695, 667.5) -> (706, 667.5)
  line L25 (706, 667.5) -> (706, 650)
  point P0 (-2450, 650)
  point P1 (714, 658)
  point P2 (706, 658)
  dimension "d211" = 11
  dimension "d212" = 17.5
  dimension "d213" = 8
  dimension "d214" = 8
  dimension "d215" = 11
  dimension "d216" = 17.5
revolve "Revolución1" add sketch "Boceto15" angle 360 about axis through (0, 3175, 0) along (0, -1, 0)
properties part number "Entorno"
